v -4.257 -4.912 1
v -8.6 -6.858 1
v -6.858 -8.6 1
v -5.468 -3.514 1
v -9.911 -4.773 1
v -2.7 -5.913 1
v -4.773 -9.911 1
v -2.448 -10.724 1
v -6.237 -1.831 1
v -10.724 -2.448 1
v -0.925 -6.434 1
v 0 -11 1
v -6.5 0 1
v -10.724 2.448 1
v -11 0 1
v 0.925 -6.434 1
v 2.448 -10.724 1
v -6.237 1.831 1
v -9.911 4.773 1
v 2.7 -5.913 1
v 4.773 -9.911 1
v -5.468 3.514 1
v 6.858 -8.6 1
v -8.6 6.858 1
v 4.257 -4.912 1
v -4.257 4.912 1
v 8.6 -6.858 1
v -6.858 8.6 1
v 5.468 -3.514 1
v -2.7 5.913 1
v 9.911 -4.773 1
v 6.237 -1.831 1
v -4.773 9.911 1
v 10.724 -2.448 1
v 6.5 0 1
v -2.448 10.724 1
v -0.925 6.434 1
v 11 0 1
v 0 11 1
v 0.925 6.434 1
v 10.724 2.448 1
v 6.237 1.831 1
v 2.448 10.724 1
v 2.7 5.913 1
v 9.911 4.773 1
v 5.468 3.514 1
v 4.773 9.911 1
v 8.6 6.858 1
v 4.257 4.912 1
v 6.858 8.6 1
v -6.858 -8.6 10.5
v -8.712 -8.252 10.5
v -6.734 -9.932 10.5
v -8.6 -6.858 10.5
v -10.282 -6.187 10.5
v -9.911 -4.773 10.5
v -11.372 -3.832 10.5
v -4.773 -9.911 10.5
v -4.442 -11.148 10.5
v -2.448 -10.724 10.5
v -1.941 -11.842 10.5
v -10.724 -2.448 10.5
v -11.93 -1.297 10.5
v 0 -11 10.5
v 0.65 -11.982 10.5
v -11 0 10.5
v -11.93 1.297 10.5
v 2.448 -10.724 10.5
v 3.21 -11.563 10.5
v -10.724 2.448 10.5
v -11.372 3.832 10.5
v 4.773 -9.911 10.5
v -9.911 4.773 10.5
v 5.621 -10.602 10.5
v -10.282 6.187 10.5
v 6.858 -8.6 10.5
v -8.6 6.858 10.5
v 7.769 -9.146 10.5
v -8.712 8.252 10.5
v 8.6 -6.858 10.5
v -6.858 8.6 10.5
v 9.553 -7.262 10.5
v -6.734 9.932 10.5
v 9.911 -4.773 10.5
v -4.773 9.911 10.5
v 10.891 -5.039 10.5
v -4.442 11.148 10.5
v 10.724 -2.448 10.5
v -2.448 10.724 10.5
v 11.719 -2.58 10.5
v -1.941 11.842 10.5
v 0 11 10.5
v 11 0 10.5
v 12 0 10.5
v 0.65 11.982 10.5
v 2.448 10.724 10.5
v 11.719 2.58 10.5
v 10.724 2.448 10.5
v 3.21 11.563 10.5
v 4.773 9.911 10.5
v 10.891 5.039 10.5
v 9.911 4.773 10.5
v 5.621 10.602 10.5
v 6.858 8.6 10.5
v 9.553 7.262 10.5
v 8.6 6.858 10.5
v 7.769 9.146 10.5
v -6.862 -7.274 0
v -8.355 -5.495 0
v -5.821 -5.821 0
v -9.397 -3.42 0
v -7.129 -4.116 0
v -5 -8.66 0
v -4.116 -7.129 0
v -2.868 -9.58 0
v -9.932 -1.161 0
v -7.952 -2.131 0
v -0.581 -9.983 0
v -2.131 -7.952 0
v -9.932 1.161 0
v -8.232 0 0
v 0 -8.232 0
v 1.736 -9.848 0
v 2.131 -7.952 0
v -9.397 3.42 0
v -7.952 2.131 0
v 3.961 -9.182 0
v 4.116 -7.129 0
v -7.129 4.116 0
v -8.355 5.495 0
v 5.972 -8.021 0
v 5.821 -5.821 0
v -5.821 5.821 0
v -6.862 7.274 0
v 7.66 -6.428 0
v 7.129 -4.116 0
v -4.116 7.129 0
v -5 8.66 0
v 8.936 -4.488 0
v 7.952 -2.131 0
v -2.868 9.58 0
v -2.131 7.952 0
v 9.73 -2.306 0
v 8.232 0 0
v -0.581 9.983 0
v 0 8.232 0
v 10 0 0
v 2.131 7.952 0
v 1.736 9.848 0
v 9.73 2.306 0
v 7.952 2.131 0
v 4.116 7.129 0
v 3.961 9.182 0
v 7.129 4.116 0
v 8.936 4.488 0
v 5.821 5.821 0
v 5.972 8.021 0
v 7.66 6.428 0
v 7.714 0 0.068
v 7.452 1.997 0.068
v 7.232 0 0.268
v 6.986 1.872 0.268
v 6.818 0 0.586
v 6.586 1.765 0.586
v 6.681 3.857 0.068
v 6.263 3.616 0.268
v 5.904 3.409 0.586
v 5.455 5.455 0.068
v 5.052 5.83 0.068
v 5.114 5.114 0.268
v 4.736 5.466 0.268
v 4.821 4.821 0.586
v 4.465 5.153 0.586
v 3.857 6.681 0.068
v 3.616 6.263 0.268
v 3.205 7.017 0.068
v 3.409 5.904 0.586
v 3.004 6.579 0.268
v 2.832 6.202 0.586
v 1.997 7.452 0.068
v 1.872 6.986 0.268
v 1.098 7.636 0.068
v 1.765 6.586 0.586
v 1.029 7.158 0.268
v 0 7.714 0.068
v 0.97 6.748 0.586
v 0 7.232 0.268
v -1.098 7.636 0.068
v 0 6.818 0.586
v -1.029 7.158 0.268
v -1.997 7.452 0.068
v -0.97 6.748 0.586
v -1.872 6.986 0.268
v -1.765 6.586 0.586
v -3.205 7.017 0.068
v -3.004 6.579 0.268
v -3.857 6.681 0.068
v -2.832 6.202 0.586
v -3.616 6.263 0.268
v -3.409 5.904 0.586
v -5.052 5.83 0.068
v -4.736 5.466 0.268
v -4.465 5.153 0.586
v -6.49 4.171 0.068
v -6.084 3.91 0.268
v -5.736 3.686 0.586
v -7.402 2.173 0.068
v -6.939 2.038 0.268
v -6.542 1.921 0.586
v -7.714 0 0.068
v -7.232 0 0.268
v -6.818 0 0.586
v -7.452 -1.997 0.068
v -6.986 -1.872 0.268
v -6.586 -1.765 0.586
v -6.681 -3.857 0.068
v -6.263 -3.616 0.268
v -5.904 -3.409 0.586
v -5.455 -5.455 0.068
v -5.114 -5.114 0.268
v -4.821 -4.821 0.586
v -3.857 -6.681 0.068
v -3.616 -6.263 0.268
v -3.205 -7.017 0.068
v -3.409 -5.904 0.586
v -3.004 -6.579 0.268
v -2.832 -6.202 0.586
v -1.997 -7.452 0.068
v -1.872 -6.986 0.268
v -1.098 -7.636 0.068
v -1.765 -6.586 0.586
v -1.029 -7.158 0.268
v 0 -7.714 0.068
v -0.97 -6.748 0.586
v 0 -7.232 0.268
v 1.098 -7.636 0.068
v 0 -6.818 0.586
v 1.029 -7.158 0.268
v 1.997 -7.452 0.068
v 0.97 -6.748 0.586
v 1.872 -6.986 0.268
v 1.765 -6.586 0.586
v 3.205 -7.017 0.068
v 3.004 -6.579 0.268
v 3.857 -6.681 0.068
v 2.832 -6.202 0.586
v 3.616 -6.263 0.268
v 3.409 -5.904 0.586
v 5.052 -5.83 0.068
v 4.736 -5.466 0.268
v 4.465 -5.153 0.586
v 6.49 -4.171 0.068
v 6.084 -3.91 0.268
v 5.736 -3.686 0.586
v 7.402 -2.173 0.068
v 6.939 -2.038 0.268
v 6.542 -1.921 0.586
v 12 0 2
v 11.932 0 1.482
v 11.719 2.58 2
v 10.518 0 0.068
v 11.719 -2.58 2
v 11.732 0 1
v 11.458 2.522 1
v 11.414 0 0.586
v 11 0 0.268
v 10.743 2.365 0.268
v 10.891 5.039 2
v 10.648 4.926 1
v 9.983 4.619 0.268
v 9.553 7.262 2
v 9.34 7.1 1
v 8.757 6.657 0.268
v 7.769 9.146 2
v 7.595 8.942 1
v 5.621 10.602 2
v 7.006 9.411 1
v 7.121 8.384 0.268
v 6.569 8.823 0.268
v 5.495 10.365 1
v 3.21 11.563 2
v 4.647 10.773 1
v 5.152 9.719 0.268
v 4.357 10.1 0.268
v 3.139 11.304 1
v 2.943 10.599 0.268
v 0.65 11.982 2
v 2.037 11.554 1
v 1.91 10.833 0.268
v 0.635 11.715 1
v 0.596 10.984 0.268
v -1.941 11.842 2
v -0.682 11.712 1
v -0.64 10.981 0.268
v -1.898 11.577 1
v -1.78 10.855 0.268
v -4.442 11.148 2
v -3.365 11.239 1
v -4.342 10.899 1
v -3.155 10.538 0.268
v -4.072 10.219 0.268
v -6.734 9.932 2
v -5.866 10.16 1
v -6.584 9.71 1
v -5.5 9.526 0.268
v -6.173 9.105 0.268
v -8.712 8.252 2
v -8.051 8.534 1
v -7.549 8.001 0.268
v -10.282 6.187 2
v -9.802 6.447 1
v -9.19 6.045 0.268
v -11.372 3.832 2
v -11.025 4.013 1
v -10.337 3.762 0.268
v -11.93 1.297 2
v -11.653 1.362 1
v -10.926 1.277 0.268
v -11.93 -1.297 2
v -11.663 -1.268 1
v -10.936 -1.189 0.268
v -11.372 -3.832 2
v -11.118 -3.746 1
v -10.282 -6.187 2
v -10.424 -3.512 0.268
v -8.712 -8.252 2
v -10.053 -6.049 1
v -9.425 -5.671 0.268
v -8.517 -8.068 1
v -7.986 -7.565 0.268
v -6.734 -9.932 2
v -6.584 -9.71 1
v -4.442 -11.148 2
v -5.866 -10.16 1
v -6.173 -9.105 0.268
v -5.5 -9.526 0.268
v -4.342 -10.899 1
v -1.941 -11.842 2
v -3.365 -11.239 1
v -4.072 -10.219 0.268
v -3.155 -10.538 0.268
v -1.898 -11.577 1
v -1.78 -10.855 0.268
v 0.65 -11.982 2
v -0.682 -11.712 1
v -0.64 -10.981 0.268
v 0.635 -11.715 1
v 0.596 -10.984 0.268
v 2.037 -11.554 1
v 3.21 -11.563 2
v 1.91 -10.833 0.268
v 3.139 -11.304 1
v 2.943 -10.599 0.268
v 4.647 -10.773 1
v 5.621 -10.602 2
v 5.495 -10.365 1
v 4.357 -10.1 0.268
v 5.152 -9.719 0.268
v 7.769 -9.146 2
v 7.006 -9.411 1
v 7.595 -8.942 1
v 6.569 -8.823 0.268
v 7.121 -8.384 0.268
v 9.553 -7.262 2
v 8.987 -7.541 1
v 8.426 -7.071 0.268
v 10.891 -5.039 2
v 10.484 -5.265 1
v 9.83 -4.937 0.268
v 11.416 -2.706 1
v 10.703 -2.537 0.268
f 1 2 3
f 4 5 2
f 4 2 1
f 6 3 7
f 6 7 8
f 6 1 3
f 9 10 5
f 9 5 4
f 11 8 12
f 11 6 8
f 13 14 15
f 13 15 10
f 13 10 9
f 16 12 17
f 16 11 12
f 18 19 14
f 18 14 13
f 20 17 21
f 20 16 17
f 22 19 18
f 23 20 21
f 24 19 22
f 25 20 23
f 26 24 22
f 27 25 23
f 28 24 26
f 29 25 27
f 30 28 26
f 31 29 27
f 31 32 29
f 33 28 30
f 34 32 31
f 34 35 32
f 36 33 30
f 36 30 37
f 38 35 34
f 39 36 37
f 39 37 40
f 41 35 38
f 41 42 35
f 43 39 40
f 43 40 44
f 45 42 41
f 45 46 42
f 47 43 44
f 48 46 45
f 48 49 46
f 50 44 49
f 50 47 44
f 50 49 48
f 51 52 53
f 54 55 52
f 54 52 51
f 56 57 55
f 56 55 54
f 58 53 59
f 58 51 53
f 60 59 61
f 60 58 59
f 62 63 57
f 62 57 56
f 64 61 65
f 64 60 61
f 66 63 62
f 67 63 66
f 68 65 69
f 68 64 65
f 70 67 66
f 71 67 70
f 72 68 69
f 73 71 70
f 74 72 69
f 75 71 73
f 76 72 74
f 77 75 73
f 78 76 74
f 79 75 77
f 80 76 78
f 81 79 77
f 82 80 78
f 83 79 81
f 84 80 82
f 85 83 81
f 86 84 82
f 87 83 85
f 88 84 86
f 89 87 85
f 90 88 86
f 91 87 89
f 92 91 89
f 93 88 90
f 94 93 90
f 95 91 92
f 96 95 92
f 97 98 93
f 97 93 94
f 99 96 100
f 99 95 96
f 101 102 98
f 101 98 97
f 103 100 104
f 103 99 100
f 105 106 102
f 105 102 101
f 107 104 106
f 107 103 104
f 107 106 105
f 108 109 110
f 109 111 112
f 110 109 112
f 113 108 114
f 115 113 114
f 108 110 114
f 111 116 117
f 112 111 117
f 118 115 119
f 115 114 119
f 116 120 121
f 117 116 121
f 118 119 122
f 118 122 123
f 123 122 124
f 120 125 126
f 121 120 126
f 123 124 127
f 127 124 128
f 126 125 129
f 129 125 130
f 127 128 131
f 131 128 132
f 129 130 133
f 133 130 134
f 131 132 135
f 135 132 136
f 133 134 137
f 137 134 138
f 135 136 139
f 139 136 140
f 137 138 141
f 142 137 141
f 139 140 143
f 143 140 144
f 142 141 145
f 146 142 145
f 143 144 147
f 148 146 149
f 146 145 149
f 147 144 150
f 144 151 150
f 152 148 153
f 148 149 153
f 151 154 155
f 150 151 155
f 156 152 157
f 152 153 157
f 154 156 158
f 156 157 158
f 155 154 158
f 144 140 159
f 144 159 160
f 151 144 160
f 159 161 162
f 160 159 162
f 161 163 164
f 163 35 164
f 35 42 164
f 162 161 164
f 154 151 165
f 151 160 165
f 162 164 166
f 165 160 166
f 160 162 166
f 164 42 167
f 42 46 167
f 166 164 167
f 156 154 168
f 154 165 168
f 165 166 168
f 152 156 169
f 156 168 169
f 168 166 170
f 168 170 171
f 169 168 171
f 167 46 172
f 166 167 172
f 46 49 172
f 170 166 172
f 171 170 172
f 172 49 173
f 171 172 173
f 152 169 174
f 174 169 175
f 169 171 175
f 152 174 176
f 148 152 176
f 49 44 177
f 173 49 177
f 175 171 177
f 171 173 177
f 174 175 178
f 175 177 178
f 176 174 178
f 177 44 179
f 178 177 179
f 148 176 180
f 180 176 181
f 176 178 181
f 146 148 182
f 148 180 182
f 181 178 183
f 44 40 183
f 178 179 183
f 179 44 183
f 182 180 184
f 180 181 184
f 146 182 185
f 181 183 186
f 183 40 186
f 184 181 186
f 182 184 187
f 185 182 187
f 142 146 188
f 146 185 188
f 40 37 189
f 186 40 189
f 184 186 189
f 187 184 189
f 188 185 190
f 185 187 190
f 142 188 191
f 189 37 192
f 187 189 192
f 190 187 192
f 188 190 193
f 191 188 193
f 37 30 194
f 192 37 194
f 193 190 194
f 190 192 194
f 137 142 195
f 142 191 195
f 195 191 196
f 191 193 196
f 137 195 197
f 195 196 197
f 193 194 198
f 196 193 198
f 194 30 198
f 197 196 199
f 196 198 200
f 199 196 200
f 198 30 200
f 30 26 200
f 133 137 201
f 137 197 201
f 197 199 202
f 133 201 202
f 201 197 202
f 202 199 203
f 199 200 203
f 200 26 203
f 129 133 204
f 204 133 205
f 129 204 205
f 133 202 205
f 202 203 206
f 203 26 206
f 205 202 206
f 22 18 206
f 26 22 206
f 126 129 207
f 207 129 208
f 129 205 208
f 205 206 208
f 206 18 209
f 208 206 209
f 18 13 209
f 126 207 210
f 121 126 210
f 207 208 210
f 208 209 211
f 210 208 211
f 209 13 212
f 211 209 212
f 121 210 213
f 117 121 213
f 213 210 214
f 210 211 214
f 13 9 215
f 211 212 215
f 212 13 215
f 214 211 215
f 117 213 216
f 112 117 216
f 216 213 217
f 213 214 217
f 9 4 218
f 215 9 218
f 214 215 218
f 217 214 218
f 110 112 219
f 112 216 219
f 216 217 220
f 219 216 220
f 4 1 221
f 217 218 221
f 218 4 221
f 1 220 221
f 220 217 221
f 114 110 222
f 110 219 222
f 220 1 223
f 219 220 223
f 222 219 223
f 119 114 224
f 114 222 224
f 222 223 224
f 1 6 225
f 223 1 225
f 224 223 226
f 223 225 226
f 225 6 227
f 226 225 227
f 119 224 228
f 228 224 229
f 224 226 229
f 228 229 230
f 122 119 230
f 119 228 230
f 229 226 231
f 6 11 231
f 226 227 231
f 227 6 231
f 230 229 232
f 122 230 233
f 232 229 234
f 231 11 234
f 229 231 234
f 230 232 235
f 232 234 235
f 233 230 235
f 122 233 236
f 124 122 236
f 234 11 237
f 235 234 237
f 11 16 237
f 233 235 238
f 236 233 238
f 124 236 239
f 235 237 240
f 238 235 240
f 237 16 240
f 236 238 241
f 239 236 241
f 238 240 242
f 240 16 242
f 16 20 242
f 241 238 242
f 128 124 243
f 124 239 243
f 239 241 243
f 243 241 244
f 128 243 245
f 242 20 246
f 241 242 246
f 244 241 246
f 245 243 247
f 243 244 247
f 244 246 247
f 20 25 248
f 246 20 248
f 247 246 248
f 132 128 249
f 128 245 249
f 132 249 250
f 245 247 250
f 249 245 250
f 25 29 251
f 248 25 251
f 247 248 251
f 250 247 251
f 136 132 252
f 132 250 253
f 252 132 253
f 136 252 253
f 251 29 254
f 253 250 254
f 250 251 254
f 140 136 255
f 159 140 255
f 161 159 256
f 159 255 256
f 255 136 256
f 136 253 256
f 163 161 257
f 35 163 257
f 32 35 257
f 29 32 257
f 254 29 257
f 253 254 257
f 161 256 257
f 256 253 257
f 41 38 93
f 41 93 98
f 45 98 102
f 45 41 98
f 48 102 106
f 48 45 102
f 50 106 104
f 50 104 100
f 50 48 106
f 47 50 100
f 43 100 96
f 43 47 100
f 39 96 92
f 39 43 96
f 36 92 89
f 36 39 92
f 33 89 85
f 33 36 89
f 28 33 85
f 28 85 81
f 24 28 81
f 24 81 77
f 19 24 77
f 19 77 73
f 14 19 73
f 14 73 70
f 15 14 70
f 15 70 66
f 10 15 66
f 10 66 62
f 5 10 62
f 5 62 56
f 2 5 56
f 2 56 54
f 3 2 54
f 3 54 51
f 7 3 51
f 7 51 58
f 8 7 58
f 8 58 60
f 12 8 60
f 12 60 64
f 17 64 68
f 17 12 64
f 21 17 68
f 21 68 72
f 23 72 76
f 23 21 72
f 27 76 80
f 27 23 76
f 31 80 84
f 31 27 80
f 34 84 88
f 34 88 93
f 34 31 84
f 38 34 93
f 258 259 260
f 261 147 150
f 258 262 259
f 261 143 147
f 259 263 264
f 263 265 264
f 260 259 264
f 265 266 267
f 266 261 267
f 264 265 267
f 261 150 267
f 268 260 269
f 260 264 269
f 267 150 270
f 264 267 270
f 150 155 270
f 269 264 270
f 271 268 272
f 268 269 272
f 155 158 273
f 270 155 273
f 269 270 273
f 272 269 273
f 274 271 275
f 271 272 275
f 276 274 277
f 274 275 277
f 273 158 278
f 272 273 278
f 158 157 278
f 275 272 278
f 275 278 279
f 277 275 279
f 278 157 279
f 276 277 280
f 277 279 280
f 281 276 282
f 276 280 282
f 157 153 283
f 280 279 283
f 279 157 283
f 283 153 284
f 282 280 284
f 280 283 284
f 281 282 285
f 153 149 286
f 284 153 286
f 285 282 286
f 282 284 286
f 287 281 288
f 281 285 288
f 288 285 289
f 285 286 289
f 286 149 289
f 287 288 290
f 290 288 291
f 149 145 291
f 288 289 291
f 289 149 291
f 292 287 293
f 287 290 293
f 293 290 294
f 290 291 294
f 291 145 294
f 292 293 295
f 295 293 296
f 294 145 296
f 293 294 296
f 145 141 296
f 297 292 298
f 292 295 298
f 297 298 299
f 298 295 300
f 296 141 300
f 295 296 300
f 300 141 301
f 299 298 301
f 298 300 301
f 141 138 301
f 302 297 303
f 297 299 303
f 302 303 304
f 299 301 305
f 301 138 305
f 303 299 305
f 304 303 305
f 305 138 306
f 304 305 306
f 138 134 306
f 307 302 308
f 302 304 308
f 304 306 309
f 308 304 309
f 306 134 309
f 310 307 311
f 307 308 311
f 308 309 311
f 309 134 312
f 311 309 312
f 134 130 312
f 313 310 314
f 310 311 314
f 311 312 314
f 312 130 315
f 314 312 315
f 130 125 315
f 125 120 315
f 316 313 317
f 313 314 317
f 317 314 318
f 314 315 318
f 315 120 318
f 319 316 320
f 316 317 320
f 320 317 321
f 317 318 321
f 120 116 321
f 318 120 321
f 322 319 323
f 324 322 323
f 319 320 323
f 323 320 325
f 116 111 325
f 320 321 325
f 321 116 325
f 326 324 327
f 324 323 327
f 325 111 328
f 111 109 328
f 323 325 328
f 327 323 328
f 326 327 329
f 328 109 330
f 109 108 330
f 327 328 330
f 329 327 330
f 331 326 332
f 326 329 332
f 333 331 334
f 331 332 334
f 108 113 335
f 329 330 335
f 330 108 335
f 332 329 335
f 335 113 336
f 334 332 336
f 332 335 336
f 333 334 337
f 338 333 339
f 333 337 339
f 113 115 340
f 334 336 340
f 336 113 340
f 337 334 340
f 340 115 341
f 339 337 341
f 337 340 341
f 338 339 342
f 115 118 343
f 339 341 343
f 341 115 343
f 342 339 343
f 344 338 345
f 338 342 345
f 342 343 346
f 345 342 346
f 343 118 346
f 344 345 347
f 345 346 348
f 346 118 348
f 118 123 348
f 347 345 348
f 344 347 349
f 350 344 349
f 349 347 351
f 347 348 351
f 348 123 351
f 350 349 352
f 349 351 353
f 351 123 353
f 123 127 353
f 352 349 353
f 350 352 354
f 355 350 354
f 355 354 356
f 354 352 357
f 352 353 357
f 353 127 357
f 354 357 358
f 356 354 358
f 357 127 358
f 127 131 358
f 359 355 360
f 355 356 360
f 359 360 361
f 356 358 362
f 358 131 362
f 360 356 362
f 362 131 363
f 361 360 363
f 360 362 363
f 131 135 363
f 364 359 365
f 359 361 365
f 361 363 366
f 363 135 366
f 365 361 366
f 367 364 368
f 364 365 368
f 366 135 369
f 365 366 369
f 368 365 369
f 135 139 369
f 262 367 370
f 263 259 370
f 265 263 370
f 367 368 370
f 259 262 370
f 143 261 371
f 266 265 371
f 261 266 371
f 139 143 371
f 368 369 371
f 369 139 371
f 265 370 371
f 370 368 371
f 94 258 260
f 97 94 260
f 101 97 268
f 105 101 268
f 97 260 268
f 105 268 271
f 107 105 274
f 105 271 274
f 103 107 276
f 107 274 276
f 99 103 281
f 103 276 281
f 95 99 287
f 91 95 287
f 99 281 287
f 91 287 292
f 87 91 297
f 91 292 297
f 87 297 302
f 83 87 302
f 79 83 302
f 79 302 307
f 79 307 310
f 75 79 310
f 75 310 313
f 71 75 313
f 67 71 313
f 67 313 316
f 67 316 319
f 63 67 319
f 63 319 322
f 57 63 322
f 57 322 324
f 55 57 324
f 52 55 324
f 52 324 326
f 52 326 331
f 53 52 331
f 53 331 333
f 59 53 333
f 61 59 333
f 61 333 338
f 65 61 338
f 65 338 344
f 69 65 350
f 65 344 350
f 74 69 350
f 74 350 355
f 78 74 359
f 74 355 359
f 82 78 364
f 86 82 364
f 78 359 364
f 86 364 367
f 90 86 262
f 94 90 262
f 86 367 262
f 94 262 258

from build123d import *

# Parameters (mm, degrees)
F0_R     = 12
F0_R_2   = 11
F1_DEPTH = 10.5
F2_DEPTH = 1
F3_R     = 6.5
F4_DEPTH = 25


# Not quite as in the source:
# - a fillet or chamfer that OpenCascade refuses, or shapes differently, is made with other operations: its cross-section is extruded or revolved along the edge and cut away or added


with BuildPart() as f1:
    # F0 (on Top) → F1 (new body)
    with BuildSketch(Plane.XY):
        Circle(F0_R)
        Circle(F0_R_2, mode=Mode.SUBTRACT)
    extrude(amount=F1_DEPTH)

    # F0 (on Top) → F2 (join)
    with BuildSketch(Plane.XY):
        Circle(F0_R_2)
    extrude(amount=F2_DEPTH)

    # F3 (on face) → F4 (cut)
    with BuildSketch(Plane.XY):
        Circle(F3_R)
    extrude(amount=F4_DEPTH, mode=Mode.SUBTRACT)

    # F5: fillet of radius 2 on 2 edges, made by hand

    # F5_s1 → F5_t2 (revolve, cut)
    with BuildSketch(Plane.XZ):
        with BuildLine():
            ThreePointArc((12, 2), (11.4142135624, 0.5857864376), (10, 0))
            Line((10, 0), (12, 0))
            Line((12, 0), (12, 2))
        make_face()
    revolve(axis=Axis((0, 0, 0), (0, 0, 1)), mode=Mode.SUBTRACT)

    # F5_s3 → F5_t4 (revolve, cut)
    with BuildSketch(Plane.XZ):
        with BuildLine():
            ThreePointArc((8.2320508076, 0), (7.2320508076, 0.2679491924), (6.5, 1))
            Line((6.5, 1), (6.5, 0))
            Line((6.5, 0), (8.2320508076, 0))
        make_face()
    revolve(axis=Axis((0, 0, 0), (0, 0, 1)), mode=Mode.SUBTRACT)


solid = f1.part
